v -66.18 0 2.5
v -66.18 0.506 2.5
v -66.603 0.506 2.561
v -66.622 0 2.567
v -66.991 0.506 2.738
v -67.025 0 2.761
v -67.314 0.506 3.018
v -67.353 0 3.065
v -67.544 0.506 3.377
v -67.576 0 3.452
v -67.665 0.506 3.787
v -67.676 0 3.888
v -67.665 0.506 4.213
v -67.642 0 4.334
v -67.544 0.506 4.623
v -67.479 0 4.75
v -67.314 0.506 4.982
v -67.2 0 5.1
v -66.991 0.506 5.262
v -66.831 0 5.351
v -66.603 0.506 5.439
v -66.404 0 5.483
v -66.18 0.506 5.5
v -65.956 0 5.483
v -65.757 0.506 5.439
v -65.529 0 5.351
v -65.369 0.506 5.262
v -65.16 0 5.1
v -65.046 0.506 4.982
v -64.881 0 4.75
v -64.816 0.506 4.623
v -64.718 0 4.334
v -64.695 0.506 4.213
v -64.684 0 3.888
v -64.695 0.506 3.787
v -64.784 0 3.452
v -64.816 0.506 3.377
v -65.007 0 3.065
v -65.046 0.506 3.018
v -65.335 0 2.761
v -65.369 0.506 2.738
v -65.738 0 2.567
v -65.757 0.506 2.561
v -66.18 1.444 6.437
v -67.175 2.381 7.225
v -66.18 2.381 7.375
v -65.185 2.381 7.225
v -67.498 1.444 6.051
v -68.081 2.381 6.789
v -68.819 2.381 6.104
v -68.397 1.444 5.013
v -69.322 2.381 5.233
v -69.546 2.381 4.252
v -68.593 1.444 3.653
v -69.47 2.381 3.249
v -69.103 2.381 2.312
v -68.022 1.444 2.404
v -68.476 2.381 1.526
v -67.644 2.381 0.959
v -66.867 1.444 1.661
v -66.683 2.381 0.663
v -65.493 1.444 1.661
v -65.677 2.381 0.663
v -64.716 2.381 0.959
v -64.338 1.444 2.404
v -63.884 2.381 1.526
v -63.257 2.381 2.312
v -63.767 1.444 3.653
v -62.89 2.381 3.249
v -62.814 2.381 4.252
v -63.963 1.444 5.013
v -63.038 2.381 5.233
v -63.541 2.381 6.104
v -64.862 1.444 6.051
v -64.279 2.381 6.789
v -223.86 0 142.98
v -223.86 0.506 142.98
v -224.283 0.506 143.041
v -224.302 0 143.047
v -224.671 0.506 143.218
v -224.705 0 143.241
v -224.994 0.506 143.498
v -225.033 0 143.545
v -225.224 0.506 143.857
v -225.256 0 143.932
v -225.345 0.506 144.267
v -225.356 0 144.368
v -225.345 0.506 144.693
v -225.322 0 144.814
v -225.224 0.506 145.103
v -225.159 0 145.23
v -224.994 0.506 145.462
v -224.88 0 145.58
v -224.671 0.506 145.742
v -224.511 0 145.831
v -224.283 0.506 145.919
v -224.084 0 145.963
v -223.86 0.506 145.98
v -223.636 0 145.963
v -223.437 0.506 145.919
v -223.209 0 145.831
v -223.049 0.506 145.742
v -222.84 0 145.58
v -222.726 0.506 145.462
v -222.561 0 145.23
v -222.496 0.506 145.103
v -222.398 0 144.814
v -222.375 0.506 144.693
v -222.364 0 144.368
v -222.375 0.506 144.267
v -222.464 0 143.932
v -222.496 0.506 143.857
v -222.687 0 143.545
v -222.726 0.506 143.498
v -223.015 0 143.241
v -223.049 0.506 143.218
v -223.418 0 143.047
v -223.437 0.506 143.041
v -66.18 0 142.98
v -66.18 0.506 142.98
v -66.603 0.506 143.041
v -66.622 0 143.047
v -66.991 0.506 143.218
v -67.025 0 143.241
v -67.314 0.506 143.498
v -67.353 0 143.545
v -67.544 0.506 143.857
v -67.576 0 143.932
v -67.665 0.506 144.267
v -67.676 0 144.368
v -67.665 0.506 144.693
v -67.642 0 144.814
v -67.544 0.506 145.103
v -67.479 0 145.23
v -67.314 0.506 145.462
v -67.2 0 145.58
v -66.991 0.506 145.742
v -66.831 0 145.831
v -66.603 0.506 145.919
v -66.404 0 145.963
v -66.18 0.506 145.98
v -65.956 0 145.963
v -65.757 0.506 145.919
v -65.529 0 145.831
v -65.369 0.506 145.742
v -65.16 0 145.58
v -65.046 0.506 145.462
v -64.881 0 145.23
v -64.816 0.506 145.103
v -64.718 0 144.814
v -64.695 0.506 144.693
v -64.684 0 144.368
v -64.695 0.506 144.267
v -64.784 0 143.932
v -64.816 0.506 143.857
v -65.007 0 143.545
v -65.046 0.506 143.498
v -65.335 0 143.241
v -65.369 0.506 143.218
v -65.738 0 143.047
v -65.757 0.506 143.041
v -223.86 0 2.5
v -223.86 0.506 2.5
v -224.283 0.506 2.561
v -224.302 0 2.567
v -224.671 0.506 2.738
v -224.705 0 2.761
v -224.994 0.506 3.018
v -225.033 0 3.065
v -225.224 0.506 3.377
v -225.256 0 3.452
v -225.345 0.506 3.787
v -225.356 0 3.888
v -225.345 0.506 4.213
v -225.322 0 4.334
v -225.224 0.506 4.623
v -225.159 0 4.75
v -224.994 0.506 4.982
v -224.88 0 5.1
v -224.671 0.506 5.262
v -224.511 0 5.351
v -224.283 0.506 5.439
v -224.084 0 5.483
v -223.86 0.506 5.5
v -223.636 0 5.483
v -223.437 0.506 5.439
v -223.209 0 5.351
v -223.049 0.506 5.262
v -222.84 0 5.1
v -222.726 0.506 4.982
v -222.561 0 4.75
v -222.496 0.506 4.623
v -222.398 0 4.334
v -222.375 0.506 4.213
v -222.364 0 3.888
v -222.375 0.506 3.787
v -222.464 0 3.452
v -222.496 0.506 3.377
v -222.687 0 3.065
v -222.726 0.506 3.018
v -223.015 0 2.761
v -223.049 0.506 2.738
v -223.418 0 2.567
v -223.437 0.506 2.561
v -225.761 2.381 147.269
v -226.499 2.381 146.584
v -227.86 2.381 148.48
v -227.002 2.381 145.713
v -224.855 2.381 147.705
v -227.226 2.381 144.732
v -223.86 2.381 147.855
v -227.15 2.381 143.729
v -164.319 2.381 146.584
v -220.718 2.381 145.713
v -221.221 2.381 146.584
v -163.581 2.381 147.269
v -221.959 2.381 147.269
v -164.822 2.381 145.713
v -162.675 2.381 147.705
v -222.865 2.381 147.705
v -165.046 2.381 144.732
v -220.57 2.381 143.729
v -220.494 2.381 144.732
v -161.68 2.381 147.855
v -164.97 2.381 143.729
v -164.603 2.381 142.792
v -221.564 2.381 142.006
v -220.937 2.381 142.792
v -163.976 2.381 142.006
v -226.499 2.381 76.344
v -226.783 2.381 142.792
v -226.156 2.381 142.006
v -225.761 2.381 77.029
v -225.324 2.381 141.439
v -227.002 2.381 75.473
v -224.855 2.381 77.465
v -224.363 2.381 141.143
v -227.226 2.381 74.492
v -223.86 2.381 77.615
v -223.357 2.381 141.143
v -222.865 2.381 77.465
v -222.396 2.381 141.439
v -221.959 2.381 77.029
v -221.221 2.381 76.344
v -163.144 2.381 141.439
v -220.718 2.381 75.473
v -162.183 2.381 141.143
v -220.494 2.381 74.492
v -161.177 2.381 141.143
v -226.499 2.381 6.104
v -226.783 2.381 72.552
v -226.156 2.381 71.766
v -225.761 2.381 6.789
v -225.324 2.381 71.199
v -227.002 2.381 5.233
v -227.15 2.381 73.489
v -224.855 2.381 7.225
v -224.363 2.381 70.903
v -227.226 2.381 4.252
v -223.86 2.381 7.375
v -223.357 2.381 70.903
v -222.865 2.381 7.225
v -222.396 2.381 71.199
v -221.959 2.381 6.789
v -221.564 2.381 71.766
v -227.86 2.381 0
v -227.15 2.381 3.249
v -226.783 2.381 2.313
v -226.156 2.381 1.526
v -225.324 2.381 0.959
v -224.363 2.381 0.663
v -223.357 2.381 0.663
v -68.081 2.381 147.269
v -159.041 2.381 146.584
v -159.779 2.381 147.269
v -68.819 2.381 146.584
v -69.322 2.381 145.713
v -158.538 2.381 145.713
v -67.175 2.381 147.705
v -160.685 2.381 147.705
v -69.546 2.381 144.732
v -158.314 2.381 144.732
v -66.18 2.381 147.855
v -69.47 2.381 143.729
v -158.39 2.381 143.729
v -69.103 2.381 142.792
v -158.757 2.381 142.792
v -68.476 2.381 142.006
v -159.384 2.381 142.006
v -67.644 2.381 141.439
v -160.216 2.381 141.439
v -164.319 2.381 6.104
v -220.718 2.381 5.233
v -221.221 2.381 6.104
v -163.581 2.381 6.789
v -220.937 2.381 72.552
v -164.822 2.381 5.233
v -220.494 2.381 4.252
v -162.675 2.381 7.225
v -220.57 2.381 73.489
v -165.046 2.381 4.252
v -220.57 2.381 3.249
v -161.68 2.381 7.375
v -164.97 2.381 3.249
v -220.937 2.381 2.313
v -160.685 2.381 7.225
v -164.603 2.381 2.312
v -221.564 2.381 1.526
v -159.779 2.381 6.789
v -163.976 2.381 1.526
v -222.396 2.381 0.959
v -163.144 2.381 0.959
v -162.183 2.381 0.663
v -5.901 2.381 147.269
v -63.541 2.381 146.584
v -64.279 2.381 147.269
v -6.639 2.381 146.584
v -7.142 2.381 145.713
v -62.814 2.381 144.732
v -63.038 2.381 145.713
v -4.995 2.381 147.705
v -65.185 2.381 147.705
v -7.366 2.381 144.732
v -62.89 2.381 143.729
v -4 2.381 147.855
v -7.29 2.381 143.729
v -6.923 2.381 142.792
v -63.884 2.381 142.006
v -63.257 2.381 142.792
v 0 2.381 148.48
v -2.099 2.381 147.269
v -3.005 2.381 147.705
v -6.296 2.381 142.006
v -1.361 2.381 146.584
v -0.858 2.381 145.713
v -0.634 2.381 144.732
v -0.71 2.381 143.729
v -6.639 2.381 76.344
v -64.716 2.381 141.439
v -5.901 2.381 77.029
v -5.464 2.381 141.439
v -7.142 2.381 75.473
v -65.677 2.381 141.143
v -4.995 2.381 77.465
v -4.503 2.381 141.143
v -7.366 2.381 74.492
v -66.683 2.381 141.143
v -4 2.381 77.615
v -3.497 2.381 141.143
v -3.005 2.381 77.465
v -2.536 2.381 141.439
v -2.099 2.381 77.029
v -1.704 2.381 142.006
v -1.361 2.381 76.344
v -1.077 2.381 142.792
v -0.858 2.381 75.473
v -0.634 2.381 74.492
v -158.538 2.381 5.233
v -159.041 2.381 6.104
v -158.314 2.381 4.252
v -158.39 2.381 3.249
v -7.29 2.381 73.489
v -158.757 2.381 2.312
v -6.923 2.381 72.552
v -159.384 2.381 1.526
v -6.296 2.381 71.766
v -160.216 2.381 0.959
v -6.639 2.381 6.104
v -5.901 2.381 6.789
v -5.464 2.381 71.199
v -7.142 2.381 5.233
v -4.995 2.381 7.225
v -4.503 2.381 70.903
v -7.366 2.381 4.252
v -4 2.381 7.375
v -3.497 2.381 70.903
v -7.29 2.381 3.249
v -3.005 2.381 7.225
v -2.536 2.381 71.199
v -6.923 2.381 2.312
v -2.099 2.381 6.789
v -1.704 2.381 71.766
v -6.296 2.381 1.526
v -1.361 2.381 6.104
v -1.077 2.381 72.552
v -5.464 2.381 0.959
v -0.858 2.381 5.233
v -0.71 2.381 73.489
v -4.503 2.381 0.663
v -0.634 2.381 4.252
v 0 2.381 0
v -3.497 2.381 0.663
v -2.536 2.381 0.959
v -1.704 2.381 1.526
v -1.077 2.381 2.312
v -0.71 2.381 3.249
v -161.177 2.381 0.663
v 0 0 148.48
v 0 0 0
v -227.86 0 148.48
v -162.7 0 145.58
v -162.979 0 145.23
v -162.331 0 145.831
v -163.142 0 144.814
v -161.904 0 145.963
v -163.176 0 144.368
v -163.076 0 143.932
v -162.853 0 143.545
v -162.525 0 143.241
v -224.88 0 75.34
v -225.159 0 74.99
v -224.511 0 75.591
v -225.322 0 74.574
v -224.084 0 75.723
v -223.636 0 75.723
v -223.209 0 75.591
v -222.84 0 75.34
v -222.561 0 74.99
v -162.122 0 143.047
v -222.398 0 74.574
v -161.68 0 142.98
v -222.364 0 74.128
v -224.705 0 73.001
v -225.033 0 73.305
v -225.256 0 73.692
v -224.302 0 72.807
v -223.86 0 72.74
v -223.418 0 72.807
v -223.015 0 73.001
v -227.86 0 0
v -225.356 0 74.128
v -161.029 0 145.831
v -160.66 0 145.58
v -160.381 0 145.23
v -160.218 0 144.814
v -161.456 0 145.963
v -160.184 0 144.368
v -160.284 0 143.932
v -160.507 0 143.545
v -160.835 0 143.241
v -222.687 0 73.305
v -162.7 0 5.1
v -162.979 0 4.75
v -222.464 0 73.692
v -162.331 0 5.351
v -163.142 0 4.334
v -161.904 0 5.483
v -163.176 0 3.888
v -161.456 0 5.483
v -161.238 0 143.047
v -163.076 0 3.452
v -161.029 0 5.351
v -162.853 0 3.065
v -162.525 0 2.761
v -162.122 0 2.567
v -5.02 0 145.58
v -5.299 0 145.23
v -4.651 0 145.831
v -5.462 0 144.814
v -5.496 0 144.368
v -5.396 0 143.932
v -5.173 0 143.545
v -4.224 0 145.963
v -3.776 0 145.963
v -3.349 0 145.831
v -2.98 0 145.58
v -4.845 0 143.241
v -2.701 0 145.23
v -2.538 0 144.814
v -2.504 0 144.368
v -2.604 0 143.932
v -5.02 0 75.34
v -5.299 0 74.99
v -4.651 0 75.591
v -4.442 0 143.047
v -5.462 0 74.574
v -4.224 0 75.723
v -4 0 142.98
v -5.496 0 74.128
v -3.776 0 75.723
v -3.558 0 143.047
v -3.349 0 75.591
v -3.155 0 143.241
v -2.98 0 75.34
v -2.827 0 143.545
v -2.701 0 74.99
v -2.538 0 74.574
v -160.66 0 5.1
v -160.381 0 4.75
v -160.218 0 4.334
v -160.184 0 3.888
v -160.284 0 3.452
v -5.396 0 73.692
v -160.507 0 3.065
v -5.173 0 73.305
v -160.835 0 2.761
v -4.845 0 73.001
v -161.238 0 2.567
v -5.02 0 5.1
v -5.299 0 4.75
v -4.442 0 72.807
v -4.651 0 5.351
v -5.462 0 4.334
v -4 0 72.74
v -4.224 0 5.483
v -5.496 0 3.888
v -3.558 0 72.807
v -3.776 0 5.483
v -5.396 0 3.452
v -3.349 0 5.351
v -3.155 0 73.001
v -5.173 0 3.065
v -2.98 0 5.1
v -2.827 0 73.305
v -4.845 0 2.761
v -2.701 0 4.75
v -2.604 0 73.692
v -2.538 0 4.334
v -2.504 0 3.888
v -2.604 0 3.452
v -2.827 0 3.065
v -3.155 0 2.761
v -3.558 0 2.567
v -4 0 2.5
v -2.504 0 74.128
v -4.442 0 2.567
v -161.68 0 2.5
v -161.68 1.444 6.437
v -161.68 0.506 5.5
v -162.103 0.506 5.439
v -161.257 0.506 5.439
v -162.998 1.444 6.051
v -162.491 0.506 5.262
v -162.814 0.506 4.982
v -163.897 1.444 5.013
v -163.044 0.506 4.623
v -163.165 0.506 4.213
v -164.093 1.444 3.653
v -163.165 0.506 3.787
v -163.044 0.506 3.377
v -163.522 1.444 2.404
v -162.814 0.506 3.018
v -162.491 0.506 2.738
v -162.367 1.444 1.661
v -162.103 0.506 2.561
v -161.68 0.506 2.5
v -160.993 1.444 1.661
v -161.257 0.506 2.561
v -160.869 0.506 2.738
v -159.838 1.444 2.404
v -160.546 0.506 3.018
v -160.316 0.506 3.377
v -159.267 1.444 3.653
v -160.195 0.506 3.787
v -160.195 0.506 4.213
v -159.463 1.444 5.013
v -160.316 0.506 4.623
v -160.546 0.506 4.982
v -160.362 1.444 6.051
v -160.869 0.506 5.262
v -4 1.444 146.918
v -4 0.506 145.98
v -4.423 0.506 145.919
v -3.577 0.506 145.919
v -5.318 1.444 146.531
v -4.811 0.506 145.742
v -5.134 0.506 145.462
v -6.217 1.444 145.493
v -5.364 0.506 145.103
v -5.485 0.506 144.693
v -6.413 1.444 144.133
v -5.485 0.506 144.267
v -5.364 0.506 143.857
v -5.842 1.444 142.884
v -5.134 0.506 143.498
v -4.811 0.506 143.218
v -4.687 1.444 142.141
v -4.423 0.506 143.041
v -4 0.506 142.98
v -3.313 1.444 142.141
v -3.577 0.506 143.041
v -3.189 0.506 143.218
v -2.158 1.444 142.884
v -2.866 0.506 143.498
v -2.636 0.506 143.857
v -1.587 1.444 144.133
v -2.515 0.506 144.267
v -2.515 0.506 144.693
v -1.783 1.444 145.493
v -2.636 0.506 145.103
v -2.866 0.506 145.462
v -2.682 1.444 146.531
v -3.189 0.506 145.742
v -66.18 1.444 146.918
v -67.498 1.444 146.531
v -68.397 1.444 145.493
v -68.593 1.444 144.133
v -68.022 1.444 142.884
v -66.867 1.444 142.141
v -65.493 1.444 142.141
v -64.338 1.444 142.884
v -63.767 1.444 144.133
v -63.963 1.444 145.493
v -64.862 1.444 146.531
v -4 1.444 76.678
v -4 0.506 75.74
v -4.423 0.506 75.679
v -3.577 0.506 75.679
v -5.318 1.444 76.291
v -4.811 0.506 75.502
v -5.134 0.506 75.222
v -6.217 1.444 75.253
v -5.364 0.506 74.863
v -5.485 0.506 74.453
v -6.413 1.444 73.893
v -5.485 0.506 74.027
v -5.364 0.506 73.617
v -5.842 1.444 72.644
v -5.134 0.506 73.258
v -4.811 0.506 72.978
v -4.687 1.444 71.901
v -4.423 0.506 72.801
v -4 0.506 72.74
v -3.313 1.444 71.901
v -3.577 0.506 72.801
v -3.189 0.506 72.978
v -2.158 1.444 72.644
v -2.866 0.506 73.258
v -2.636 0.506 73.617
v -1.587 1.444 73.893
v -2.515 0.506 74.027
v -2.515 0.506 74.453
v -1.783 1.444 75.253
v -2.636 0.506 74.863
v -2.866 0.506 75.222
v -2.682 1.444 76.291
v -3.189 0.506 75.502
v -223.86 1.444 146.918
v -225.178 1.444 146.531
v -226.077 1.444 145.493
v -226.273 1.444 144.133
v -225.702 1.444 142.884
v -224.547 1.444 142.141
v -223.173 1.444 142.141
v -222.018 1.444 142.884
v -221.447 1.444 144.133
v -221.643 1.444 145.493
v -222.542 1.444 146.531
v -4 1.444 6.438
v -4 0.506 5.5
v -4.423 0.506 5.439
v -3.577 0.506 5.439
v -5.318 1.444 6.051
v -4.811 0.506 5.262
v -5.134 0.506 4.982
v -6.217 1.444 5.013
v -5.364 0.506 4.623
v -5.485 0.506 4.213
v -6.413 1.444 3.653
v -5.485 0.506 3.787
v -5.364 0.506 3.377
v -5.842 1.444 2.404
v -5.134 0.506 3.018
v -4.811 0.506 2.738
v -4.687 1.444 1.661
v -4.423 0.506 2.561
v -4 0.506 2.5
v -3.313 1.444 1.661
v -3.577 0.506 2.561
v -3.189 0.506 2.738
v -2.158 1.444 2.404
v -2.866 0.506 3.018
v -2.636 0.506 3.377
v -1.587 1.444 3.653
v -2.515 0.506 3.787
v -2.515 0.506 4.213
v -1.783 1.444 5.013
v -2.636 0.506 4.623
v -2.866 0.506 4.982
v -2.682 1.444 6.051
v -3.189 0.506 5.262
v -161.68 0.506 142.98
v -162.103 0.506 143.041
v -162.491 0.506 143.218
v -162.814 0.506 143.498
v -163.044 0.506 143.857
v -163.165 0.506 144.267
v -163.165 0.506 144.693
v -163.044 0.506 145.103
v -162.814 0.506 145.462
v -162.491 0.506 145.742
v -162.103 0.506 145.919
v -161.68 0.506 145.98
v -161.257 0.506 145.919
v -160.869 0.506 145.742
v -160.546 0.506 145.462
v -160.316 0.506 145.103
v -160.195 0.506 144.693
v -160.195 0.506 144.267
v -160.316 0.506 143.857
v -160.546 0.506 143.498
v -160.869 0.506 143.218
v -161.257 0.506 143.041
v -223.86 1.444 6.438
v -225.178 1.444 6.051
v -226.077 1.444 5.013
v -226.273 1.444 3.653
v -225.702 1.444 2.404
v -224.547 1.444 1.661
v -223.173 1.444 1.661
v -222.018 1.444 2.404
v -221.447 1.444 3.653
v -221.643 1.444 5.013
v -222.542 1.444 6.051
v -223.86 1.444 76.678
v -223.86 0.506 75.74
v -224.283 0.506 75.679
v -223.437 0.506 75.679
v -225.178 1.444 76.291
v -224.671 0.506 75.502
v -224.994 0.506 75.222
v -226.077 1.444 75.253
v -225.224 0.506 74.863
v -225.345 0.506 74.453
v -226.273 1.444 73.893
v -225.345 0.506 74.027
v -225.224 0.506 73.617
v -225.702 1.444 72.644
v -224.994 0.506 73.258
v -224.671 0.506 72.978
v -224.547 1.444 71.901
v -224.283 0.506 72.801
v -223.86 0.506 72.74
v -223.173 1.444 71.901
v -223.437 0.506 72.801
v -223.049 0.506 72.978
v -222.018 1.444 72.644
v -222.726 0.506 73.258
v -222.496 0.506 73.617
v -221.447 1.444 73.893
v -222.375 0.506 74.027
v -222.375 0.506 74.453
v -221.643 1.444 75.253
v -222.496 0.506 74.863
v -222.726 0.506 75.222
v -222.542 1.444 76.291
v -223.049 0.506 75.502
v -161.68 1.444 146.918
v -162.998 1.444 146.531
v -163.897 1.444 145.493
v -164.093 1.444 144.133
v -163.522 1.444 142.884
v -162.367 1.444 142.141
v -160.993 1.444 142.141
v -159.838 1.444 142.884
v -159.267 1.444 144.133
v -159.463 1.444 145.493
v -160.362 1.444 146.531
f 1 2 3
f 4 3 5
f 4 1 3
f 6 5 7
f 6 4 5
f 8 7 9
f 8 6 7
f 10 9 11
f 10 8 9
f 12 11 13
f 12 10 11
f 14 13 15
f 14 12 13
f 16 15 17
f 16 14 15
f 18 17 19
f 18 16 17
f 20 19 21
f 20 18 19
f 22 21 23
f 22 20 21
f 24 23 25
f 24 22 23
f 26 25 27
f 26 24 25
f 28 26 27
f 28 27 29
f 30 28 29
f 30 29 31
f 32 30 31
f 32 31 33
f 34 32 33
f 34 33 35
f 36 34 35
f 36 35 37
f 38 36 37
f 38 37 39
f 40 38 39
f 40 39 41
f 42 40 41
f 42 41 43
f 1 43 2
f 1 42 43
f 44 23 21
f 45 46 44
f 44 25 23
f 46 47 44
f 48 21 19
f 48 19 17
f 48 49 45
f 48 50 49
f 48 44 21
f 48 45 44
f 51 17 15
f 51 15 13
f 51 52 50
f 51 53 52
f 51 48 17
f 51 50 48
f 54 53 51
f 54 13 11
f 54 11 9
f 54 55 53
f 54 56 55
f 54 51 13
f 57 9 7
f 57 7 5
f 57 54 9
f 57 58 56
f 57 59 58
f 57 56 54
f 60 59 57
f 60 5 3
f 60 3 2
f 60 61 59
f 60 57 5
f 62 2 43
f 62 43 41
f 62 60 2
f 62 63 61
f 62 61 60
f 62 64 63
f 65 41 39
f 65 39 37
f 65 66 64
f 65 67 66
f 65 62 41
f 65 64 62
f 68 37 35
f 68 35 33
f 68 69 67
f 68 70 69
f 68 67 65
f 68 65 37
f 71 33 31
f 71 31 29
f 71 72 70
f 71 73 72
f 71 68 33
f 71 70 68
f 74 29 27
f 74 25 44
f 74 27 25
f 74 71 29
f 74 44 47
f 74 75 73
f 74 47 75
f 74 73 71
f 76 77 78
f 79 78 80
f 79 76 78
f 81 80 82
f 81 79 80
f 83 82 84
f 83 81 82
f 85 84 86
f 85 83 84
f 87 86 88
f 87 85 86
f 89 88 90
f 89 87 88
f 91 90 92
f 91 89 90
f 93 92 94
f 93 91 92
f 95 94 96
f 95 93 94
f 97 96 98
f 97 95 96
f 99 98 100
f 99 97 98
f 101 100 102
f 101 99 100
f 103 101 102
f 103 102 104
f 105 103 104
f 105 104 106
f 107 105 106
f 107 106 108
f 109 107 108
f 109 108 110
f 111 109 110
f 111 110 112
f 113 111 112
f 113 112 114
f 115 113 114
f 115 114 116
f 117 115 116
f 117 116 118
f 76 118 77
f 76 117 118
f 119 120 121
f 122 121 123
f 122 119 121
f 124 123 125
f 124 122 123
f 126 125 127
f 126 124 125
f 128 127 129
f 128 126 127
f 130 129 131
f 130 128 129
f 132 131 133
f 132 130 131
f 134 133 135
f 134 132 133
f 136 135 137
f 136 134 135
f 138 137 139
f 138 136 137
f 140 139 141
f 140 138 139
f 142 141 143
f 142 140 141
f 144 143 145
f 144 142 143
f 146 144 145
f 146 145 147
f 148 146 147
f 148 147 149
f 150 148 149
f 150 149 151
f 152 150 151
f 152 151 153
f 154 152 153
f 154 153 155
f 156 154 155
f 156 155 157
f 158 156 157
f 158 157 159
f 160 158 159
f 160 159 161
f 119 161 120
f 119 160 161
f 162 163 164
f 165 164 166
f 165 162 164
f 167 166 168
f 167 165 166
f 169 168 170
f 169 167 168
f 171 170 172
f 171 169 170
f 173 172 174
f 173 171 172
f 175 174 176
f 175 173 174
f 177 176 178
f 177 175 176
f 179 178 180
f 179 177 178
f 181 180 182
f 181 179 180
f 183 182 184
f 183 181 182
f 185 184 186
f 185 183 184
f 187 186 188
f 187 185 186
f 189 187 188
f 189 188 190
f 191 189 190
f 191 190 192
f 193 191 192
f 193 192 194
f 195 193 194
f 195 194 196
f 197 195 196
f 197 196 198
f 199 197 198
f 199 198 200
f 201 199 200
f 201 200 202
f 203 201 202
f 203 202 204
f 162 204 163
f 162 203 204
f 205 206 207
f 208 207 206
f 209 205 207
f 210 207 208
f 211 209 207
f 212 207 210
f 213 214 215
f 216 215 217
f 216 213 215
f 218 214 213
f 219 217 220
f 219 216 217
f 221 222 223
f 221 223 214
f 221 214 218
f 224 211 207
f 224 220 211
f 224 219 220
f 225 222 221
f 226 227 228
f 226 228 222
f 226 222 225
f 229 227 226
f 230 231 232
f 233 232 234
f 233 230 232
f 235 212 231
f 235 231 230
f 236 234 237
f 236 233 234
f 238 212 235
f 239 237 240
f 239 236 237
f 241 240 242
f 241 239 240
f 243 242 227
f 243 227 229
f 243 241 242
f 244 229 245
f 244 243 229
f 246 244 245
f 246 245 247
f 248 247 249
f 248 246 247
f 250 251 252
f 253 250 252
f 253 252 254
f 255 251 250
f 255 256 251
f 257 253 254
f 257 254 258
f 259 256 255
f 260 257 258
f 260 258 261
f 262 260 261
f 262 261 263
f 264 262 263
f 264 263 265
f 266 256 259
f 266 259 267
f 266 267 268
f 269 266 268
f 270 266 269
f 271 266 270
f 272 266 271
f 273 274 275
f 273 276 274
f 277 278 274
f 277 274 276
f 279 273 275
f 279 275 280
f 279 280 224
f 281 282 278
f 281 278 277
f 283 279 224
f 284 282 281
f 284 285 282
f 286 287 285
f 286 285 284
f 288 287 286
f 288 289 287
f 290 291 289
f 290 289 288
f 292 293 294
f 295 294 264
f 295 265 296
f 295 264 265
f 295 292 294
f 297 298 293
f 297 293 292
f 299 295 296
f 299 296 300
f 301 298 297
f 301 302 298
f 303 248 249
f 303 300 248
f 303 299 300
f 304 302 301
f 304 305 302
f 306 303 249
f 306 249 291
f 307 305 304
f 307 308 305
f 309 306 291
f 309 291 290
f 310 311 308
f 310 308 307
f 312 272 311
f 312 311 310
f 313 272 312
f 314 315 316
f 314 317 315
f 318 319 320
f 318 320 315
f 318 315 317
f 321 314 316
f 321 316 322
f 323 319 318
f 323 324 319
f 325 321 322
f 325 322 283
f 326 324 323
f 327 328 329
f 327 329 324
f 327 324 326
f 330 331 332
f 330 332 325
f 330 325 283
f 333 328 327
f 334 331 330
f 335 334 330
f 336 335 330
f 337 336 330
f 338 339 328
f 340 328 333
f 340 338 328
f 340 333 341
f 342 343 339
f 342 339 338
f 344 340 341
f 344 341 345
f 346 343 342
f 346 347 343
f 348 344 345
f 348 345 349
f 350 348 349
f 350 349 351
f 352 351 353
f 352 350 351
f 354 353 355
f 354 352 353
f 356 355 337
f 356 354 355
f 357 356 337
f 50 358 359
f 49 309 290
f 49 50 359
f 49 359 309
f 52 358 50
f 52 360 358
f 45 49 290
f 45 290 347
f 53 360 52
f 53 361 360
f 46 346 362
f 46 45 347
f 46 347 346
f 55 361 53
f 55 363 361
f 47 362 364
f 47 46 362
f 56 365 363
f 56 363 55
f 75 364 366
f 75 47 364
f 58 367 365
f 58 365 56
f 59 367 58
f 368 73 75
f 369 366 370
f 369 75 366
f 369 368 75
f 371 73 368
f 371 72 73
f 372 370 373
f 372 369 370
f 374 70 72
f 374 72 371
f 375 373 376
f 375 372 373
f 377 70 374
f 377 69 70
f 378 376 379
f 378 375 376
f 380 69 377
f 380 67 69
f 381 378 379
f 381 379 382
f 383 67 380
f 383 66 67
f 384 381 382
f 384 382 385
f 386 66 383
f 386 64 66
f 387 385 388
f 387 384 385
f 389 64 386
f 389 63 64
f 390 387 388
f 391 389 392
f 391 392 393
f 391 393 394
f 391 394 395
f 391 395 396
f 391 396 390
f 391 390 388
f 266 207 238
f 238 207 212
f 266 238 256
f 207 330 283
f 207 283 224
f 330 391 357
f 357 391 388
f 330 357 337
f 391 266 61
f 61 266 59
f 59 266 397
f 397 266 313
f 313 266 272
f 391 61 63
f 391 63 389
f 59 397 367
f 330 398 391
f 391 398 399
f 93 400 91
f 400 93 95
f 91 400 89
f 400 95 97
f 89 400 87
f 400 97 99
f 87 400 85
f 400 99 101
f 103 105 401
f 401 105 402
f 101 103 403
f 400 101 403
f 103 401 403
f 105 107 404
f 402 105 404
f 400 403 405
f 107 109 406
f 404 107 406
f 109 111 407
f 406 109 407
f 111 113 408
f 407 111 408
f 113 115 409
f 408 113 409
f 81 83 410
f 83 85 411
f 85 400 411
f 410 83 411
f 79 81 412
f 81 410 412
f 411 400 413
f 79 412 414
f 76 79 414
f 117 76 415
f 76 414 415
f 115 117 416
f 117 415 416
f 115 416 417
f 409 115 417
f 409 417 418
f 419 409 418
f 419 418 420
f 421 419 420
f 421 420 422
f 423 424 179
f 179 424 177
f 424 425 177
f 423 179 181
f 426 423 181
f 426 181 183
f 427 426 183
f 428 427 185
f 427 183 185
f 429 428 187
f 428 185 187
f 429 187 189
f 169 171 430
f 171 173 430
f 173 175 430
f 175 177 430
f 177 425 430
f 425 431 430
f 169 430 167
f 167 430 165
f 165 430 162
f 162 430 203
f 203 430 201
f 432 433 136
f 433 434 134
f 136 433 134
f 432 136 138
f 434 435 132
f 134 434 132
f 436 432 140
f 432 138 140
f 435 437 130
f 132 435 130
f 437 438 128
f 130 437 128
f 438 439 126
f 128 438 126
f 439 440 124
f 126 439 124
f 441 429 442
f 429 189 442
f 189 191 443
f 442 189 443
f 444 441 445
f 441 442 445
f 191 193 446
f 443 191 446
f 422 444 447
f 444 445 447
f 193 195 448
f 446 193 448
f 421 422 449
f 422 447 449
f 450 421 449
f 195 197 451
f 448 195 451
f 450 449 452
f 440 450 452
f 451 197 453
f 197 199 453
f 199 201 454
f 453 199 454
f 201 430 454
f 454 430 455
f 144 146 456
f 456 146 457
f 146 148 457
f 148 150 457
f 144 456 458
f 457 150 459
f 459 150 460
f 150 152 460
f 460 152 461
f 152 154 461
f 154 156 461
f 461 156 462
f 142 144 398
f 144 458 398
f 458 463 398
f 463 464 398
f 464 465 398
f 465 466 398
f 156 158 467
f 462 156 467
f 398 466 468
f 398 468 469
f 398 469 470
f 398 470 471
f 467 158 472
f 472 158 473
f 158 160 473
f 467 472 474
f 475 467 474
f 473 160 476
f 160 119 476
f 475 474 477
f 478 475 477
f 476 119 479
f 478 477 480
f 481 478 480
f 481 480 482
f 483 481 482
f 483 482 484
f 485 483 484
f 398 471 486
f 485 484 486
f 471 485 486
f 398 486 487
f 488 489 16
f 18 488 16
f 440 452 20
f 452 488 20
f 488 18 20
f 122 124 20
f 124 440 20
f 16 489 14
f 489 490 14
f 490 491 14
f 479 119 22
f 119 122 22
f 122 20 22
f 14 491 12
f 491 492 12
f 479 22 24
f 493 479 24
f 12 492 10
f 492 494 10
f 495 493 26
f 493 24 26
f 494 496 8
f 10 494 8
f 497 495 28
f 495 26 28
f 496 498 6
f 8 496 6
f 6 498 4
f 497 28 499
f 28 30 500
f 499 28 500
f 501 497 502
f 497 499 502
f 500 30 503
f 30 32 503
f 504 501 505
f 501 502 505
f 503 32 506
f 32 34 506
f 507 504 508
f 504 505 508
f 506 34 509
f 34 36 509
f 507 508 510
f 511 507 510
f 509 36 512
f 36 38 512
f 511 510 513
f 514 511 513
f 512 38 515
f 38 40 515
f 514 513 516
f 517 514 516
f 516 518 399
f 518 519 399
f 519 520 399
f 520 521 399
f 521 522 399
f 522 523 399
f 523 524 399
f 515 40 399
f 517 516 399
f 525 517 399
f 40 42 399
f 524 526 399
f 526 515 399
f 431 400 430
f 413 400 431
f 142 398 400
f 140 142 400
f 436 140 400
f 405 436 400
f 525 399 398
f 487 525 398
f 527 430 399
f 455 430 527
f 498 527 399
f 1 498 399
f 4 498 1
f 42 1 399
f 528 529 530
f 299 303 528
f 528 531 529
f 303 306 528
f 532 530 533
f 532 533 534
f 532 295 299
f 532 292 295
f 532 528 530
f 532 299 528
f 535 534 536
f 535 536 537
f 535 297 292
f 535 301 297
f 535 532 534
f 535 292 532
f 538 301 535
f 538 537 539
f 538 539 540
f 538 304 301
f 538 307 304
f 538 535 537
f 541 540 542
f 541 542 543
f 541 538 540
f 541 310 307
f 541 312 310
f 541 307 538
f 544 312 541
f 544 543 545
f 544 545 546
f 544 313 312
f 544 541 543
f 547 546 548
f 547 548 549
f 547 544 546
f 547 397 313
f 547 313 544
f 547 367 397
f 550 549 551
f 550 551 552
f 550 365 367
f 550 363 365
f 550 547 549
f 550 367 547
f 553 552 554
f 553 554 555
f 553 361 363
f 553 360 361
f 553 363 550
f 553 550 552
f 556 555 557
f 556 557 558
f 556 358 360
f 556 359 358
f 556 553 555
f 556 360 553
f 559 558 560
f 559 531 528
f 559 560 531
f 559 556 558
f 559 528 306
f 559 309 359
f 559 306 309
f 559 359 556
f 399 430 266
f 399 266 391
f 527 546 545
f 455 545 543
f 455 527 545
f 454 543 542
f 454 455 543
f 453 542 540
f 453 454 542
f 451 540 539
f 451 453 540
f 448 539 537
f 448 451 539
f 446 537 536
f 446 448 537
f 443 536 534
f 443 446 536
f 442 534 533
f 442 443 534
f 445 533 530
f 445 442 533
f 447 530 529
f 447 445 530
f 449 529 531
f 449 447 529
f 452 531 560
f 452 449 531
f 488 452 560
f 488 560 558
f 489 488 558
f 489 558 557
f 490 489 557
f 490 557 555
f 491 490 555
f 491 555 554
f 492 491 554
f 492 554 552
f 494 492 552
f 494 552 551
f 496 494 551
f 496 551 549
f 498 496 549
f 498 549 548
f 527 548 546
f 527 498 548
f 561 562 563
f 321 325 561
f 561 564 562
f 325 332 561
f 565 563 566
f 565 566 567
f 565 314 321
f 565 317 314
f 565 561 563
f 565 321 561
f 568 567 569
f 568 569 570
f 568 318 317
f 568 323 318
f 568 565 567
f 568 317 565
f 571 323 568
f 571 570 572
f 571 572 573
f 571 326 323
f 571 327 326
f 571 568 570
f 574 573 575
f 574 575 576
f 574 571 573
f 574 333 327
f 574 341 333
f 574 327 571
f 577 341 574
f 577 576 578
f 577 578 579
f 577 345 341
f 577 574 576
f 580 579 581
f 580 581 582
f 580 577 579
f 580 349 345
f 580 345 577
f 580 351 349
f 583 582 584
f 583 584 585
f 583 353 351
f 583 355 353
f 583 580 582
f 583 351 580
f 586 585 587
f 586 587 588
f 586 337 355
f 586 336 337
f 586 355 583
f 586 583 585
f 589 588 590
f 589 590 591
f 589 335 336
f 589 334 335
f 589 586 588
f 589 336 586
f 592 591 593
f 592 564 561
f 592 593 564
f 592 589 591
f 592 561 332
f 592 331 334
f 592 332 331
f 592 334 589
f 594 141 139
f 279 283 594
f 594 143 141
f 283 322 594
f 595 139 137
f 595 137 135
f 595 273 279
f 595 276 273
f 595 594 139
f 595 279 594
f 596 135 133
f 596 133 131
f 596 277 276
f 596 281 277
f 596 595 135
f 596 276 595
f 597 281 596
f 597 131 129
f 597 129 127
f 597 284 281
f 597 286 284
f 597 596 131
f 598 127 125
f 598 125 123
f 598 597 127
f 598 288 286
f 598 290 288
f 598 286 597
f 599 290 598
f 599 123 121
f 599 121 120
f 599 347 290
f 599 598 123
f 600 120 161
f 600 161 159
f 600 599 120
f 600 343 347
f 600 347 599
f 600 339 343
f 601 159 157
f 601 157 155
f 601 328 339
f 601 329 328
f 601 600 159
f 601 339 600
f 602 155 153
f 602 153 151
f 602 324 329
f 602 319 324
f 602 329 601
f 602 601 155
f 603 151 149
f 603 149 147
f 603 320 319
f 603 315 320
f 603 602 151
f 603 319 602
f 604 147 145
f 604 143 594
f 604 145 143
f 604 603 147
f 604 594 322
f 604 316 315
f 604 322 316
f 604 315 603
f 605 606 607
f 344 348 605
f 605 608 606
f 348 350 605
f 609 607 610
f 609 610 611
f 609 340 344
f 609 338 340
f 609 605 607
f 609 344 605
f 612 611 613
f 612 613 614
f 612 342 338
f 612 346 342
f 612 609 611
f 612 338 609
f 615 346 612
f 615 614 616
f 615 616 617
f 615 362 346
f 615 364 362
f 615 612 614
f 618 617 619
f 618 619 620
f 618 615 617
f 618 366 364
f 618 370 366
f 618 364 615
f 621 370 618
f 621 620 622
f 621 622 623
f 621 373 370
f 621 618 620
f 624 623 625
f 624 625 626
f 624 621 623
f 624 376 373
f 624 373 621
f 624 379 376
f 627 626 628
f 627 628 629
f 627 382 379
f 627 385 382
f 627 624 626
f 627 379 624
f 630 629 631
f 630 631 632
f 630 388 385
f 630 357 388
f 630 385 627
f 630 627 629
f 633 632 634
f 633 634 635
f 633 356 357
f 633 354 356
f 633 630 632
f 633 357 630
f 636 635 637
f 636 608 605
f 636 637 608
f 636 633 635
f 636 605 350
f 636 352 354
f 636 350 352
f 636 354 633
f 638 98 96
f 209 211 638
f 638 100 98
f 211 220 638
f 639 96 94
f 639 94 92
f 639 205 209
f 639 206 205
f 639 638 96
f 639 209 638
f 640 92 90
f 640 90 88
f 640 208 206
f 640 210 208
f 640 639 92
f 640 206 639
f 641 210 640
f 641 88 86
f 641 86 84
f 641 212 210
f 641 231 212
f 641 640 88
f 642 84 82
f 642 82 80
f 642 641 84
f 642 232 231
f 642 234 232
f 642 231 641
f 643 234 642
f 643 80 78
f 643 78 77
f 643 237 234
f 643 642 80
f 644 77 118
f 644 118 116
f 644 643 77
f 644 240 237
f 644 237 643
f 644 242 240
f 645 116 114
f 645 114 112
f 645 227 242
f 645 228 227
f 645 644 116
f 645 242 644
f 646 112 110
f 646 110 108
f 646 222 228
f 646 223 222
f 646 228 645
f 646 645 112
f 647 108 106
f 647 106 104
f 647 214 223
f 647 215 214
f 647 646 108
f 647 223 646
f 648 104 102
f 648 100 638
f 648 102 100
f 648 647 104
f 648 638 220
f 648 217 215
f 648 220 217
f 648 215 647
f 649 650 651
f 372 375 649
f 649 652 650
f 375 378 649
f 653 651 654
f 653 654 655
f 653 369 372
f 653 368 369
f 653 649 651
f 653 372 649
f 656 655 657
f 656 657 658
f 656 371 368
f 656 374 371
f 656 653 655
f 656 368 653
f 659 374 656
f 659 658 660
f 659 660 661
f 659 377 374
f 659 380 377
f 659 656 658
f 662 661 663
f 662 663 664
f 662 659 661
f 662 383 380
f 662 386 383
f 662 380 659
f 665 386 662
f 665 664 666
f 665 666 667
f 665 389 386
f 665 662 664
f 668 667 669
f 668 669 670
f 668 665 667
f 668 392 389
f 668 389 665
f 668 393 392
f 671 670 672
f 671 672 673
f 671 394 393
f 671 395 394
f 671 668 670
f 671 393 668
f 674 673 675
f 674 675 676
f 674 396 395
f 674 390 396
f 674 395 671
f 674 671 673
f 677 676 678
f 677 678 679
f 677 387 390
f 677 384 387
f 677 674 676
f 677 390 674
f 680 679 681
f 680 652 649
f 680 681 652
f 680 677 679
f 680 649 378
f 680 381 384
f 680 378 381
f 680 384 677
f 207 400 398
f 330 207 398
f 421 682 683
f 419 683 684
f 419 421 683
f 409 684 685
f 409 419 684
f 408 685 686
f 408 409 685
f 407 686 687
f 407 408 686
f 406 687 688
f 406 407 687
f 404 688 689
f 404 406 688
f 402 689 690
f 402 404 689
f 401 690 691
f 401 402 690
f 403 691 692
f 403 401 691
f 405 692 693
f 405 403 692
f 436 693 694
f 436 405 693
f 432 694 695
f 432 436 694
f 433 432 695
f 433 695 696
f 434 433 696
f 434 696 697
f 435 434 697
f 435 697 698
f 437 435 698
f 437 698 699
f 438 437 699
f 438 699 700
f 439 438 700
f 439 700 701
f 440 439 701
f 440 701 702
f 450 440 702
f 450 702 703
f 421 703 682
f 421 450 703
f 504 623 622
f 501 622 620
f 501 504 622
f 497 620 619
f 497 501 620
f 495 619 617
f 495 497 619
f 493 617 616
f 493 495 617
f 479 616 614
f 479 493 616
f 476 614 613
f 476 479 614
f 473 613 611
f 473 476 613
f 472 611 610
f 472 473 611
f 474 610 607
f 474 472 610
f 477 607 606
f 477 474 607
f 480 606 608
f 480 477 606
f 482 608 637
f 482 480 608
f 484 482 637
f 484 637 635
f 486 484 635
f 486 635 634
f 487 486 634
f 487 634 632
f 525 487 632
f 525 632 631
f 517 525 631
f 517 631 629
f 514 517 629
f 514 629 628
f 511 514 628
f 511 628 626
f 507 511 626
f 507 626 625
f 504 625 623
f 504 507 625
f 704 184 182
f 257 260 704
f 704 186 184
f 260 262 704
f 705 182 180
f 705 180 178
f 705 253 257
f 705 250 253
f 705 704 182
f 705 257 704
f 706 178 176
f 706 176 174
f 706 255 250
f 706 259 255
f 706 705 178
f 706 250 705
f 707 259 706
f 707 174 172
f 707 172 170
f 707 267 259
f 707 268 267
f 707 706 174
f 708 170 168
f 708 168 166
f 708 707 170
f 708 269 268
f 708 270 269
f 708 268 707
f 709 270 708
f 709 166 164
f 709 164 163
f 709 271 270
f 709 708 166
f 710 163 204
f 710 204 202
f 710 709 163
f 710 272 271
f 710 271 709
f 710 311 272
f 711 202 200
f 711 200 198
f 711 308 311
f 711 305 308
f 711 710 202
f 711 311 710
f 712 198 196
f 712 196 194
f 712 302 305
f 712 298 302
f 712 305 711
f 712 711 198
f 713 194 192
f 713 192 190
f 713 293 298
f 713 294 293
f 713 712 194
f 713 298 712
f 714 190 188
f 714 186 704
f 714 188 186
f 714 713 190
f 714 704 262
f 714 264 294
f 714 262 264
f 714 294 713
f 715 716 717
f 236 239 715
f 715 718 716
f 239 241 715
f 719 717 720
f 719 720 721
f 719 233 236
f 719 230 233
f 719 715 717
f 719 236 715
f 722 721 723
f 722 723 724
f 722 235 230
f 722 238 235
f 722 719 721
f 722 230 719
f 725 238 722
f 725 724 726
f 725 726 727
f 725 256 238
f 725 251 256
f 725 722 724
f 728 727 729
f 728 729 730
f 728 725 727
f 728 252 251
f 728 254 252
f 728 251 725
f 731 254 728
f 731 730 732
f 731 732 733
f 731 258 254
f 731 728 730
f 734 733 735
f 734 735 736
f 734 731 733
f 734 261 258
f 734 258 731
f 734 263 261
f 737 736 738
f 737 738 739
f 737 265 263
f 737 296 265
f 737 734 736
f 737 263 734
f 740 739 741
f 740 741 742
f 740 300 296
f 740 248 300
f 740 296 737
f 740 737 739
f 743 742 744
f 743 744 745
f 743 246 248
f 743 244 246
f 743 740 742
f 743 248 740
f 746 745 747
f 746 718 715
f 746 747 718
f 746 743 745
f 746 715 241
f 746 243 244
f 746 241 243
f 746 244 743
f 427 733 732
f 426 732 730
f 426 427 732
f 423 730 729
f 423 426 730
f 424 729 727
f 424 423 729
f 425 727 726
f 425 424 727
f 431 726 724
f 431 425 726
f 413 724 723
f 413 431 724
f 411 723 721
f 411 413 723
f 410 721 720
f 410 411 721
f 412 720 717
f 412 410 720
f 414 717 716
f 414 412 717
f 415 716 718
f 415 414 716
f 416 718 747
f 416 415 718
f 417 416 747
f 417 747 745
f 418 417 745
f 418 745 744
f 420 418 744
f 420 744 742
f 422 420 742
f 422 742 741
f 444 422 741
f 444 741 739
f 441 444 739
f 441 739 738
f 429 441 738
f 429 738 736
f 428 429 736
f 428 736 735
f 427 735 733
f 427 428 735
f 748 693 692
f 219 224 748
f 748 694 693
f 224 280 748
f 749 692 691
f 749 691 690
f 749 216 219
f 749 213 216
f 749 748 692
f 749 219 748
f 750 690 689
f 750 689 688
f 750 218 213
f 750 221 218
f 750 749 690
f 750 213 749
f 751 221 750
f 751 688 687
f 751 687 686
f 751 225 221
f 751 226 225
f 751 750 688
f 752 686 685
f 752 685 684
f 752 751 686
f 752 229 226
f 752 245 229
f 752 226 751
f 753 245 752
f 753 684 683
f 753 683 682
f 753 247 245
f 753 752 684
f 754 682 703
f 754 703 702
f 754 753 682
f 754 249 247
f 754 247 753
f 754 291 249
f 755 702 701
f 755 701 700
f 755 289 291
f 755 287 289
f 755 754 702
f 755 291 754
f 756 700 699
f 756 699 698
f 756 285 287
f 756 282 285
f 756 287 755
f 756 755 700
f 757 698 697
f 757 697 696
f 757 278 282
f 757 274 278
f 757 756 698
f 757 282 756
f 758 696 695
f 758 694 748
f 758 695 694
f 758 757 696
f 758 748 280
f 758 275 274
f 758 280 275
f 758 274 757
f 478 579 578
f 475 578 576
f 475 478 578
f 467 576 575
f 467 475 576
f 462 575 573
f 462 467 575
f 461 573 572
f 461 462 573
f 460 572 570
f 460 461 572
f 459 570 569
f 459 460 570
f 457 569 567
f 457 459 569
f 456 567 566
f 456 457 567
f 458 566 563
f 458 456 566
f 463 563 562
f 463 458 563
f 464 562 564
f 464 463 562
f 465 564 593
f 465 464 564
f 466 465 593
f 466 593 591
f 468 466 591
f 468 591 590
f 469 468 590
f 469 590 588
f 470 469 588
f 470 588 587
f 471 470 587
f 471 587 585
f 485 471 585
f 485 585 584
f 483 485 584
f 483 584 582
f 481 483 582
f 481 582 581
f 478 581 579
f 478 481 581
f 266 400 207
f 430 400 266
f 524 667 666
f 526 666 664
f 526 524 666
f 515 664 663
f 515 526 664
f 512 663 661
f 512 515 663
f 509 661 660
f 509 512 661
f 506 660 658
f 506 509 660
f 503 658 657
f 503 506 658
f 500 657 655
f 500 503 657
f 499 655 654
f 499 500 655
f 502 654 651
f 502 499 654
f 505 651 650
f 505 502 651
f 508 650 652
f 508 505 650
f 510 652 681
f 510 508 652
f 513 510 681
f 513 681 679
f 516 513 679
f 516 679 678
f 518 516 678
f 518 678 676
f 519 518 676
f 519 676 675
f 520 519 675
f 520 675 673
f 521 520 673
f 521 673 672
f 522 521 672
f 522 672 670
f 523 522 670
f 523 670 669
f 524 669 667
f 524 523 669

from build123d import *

# Parameters (mm, degrees)
SKETCH1_W                                      = 227.86
SKETCH1_H                                      = 148.48
SKETCH1_R                                      = 1.5
BOSS_EXTRUDE1_DEPTH                            = 2.38125
CSK_FOR_M3_FLAT_HEAD_MACHINE_SCREW6_AT_2_COUNT = 2
CSK_FOR_M3_FLAT_HEAD_MACHINE_SCREW6_AT_2_PITCH = 62.18
CSK_FOR_M3_FLAT_HEAD_MACHINE_SCREW6_AT_3_COUNT = 2
CSK_FOR_M3_FLAT_HEAD_MACHINE_SCREW6_AT_3_PITCH = 219.86
CSK_FOR_M3_FLAT_HEAD_MACHINE_SCREW6_AT_4_COUNT = 2
CSK_FOR_M3_FLAT_HEAD_MACHINE_SCREW6_AT_4_PITCH = 157.68
CSK_FOR_M3_FLAT_HEAD_MACHINE_SCREW6_AT_5_COUNT = 2
CSK_FOR_M3_FLAT_HEAD_MACHINE_SCREW6_AT_5_PITCH = 260.908125592
CSK_FOR_M3_FLAT_HEAD_MACHINE_SCREW6_AT_6_COUNT = 2
CSK_FOR_M3_FLAT_HEAD_MACHINE_SCREW6_AT_6_PITCH = 211.181468884
CSK_FOR_M3_FLAT_HEAD_MACHINE_SCREW6_AT_7_COUNT = 2
CSK_FOR_M3_FLAT_HEAD_MACHINE_SCREW6_AT_7_PITCH = 153.626113666
CSK_FOR_M3_FLAT_HEAD_MACHINE_SCREW6_AT_8_COUNT = 2
CSK_FOR_M3_FLAT_HEAD_MACHINE_SCREW6_AT_8_PITCH = 140.48
CSK_FOR_M3_FLAT_HEAD_MACHINE_SCREW7_AT_2_COUNT = 2
CSK_FOR_M3_FLAT_HEAD_MACHINE_SCREW7_AT_2_PITCH = 219.86


with BuildPart() as part:
    # Sketch1 → Boss-Extrude1 (new body)
    with BuildSketch(Plane(origin=(0, 0, 0), x_dir=(1, 0, 0), z_dir=(0, 1, 0))):
        with Locations((-113.93, -74.24)):
            Rectangle(SKETCH1_W, SKETCH1_H)
        with Locations(Location((-4, -74.24, 0), (0, 0, 90))):
            Circle(SKETCH1_R, mode=Mode.SUBTRACT)
        with Locations(Location((-223.86, -74.24, 0), (0, 0, 90))):
            Circle(SKETCH1_R, mode=Mode.SUBTRACT)
        with Locations(Location((-161.68, -144.48, 0), (0, 0, 90))):
            Circle(SKETCH1_R, mode=Mode.SUBTRACT)
        with Locations(Location((-66.18, -144.48, 0), (0, 0, 90))):
            Circle(SKETCH1_R, mode=Mode.SUBTRACT)
        with Locations(Location((-66.18, -4, 0), (0, 0, 90))):
            Circle(SKETCH1_R, mode=Mode.SUBTRACT)
        with Locations(Location((-161.68, -4, 0), (0, 0, 90))):
            Circle(SKETCH1_R, mode=Mode.SUBTRACT)
        with Locations(Location((-4, -144.48, 0), (0, 0, 90))):
            Circle(SKETCH1_R, mode=Mode.SUBTRACT)
        with Locations(Location((-223.86, -144.48, 0), (0, 0, 90))):
            Circle(SKETCH1_R, mode=Mode.SUBTRACT)
        with Locations(Location((-223.86, -4, 0), (0, 0, 90))):
            Circle(SKETCH1_R, mode=Mode.SUBTRACT)
        with Locations(Location((-4, -4, 0), (0, 0, 90))):
            Circle(SKETCH1_R, mode=Mode.SUBTRACT)
    extrude(amount=BOSS_EXTRUDE1_DEPTH)

    # Sketch22 → CSK for M3 Flat Head Machine Screw6 (revolve, cut)
    with BuildSketch(Plane(origin=(-4, 2.38125, 144.48), x_dir=(0, 0, 1), z_dir=(1, 0, 0))):
        Polygon((0, 0), (0, 2.38125), (1.5, 2.38125), (1.5, 1.875), (3.375, 0), align=None)
    csk_for_m3_flat_head_machine_screw6 = revolve(axis=Axis((-4, 8.73125, 144.48), (0, -1, 0)), mode=Mode.SUBTRACT)

    # CSK for M3 Flat Head Machine Screw6 at 2: CSK for M3 Flat Head Machine Screw6 ×2
    with Locations(*[(-i * CSK_FOR_M3_FLAT_HEAD_MACHINE_SCREW6_AT_2_PITCH, 0, 0) for i in range(1, CSK_FOR_M3_FLAT_HEAD_MACHINE_SCREW6_AT_2_COUNT)]):
        add(csk_for_m3_flat_head_machine_screw6, mode=Mode.SUBTRACT)

    # CSK for M3 Flat Head Machine Screw6 at 3: CSK for M3 Flat Head Machine Screw6 ×2
    with Locations(*[(-i * CSK_FOR_M3_FLAT_HEAD_MACHINE_SCREW6_AT_3_PITCH, 0, 0) for i in range(1, CSK_FOR_M3_FLAT_HEAD_MACHINE_SCREW6_AT_3_COUNT)]):
        add(csk_for_m3_flat_head_machine_screw6, mode=Mode.SUBTRACT)

    # CSK for M3 Flat Head Machine Screw6 at 4: CSK for M3 Flat Head Machine Screw6 ×2
    with Locations(*[(-i * CSK_FOR_M3_FLAT_HEAD_MACHINE_SCREW6_AT_4_PITCH, 0, 0) for i in range(1, CSK_FOR_M3_FLAT_HEAD_MACHINE_SCREW6_AT_4_COUNT)]):
        add(csk_for_m3_flat_head_machine_screw6, mode=Mode.SUBTRACT)

    # CSK for M3 Flat Head Machine Screw6 at 5: CSK for M3 Flat Head Machine Screw6 ×2
    with Locations(*[Vector(-0.8426721072830771, 0, -0.5384270791918794) * (i * CSK_FOR_M3_FLAT_HEAD_MACHINE_SCREW6_AT_5_PITCH) for i in range(1, CSK_FOR_M3_FLAT_HEAD_MACHINE_SCREW6_AT_5_COUNT)]):
        add(csk_for_m3_flat_head_machine_screw6, mode=Mode.SUBTRACT)

    # CSK for M3 Flat Head Machine Screw6 at 6: CSK for M3 Flat Head Machine Screw6 ×2
    with Locations(*[Vector(-0.7466564222385392, 0, -0.6652098820146497) * (i * CSK_FOR_M3_FLAT_HEAD_MACHINE_SCREW6_AT_6_PITCH) for i in range(1, CSK_FOR_M3_FLAT_HEAD_MACHINE_SCREW6_AT_6_COUNT)]):
        add(csk_for_m3_flat_head_machine_screw6, mode=Mode.SUBTRACT)

    # CSK for M3 Flat Head Machine Screw6 at 7: CSK for M3 Flat Head Machine Screw6 ×2
    with Locations(*[Vector(-0.40474889663187463, 0, -0.9144278706794101) * (i * CSK_FOR_M3_FLAT_HEAD_MACHINE_SCREW6_AT_7_PITCH) for i in range(1, CSK_FOR_M3_FLAT_HEAD_MACHINE_SCREW6_AT_7_COUNT)]):
        add(csk_for_m3_flat_head_machine_screw6, mode=Mode.SUBTRACT)

    # CSK for M3 Flat Head Machine Screw6 at 8: CSK for M3 Flat Head Machine Screw6 ×2
    with Locations(*[(0, 0, -i * CSK_FOR_M3_FLAT_HEAD_MACHINE_SCREW6_AT_8_PITCH) for i in range(1, CSK_FOR_M3_FLAT_HEAD_MACHINE_SCREW6_AT_8_COUNT)]):
        add(csk_for_m3_flat_head_machine_screw6, mode=Mode.SUBTRACT)

    # Sketch24 → CSK for M3 Flat Head Machine Screw7 (revolve, cut)
    with BuildSketch(Plane(origin=(-4, 2.38125, 74.24), x_dir=(0, 0, 1), z_dir=(1, 0, 0))):
        Polygon((0, 0), (0, 2.38125), (1.5, 2.38125), (1.5, 1.875), (3.375, 0), align=None)
    csk_for_m3_flat_head_machine_screw7 = revolve(axis=Axis((-4, 8.73125, 74.24), (0, -1, 0)), mode=Mode.SUBTRACT)

    # CSK for M3 Flat Head Machine Screw7 at 2: CSK for M3 Flat Head Machine Screw7 ×2
    with Locations(*[(-i * CSK_FOR_M3_FLAT_HEAD_MACHINE_SCREW7_AT_2_PITCH, 0, 0) for i in range(1, CSK_FOR_M3_FLAT_HEAD_MACHINE_SCREW7_AT_2_COUNT)]):
        add(csk_for_m3_flat_head_machine_screw7, mode=Mode.SUBTRACT)


solid = part.part
